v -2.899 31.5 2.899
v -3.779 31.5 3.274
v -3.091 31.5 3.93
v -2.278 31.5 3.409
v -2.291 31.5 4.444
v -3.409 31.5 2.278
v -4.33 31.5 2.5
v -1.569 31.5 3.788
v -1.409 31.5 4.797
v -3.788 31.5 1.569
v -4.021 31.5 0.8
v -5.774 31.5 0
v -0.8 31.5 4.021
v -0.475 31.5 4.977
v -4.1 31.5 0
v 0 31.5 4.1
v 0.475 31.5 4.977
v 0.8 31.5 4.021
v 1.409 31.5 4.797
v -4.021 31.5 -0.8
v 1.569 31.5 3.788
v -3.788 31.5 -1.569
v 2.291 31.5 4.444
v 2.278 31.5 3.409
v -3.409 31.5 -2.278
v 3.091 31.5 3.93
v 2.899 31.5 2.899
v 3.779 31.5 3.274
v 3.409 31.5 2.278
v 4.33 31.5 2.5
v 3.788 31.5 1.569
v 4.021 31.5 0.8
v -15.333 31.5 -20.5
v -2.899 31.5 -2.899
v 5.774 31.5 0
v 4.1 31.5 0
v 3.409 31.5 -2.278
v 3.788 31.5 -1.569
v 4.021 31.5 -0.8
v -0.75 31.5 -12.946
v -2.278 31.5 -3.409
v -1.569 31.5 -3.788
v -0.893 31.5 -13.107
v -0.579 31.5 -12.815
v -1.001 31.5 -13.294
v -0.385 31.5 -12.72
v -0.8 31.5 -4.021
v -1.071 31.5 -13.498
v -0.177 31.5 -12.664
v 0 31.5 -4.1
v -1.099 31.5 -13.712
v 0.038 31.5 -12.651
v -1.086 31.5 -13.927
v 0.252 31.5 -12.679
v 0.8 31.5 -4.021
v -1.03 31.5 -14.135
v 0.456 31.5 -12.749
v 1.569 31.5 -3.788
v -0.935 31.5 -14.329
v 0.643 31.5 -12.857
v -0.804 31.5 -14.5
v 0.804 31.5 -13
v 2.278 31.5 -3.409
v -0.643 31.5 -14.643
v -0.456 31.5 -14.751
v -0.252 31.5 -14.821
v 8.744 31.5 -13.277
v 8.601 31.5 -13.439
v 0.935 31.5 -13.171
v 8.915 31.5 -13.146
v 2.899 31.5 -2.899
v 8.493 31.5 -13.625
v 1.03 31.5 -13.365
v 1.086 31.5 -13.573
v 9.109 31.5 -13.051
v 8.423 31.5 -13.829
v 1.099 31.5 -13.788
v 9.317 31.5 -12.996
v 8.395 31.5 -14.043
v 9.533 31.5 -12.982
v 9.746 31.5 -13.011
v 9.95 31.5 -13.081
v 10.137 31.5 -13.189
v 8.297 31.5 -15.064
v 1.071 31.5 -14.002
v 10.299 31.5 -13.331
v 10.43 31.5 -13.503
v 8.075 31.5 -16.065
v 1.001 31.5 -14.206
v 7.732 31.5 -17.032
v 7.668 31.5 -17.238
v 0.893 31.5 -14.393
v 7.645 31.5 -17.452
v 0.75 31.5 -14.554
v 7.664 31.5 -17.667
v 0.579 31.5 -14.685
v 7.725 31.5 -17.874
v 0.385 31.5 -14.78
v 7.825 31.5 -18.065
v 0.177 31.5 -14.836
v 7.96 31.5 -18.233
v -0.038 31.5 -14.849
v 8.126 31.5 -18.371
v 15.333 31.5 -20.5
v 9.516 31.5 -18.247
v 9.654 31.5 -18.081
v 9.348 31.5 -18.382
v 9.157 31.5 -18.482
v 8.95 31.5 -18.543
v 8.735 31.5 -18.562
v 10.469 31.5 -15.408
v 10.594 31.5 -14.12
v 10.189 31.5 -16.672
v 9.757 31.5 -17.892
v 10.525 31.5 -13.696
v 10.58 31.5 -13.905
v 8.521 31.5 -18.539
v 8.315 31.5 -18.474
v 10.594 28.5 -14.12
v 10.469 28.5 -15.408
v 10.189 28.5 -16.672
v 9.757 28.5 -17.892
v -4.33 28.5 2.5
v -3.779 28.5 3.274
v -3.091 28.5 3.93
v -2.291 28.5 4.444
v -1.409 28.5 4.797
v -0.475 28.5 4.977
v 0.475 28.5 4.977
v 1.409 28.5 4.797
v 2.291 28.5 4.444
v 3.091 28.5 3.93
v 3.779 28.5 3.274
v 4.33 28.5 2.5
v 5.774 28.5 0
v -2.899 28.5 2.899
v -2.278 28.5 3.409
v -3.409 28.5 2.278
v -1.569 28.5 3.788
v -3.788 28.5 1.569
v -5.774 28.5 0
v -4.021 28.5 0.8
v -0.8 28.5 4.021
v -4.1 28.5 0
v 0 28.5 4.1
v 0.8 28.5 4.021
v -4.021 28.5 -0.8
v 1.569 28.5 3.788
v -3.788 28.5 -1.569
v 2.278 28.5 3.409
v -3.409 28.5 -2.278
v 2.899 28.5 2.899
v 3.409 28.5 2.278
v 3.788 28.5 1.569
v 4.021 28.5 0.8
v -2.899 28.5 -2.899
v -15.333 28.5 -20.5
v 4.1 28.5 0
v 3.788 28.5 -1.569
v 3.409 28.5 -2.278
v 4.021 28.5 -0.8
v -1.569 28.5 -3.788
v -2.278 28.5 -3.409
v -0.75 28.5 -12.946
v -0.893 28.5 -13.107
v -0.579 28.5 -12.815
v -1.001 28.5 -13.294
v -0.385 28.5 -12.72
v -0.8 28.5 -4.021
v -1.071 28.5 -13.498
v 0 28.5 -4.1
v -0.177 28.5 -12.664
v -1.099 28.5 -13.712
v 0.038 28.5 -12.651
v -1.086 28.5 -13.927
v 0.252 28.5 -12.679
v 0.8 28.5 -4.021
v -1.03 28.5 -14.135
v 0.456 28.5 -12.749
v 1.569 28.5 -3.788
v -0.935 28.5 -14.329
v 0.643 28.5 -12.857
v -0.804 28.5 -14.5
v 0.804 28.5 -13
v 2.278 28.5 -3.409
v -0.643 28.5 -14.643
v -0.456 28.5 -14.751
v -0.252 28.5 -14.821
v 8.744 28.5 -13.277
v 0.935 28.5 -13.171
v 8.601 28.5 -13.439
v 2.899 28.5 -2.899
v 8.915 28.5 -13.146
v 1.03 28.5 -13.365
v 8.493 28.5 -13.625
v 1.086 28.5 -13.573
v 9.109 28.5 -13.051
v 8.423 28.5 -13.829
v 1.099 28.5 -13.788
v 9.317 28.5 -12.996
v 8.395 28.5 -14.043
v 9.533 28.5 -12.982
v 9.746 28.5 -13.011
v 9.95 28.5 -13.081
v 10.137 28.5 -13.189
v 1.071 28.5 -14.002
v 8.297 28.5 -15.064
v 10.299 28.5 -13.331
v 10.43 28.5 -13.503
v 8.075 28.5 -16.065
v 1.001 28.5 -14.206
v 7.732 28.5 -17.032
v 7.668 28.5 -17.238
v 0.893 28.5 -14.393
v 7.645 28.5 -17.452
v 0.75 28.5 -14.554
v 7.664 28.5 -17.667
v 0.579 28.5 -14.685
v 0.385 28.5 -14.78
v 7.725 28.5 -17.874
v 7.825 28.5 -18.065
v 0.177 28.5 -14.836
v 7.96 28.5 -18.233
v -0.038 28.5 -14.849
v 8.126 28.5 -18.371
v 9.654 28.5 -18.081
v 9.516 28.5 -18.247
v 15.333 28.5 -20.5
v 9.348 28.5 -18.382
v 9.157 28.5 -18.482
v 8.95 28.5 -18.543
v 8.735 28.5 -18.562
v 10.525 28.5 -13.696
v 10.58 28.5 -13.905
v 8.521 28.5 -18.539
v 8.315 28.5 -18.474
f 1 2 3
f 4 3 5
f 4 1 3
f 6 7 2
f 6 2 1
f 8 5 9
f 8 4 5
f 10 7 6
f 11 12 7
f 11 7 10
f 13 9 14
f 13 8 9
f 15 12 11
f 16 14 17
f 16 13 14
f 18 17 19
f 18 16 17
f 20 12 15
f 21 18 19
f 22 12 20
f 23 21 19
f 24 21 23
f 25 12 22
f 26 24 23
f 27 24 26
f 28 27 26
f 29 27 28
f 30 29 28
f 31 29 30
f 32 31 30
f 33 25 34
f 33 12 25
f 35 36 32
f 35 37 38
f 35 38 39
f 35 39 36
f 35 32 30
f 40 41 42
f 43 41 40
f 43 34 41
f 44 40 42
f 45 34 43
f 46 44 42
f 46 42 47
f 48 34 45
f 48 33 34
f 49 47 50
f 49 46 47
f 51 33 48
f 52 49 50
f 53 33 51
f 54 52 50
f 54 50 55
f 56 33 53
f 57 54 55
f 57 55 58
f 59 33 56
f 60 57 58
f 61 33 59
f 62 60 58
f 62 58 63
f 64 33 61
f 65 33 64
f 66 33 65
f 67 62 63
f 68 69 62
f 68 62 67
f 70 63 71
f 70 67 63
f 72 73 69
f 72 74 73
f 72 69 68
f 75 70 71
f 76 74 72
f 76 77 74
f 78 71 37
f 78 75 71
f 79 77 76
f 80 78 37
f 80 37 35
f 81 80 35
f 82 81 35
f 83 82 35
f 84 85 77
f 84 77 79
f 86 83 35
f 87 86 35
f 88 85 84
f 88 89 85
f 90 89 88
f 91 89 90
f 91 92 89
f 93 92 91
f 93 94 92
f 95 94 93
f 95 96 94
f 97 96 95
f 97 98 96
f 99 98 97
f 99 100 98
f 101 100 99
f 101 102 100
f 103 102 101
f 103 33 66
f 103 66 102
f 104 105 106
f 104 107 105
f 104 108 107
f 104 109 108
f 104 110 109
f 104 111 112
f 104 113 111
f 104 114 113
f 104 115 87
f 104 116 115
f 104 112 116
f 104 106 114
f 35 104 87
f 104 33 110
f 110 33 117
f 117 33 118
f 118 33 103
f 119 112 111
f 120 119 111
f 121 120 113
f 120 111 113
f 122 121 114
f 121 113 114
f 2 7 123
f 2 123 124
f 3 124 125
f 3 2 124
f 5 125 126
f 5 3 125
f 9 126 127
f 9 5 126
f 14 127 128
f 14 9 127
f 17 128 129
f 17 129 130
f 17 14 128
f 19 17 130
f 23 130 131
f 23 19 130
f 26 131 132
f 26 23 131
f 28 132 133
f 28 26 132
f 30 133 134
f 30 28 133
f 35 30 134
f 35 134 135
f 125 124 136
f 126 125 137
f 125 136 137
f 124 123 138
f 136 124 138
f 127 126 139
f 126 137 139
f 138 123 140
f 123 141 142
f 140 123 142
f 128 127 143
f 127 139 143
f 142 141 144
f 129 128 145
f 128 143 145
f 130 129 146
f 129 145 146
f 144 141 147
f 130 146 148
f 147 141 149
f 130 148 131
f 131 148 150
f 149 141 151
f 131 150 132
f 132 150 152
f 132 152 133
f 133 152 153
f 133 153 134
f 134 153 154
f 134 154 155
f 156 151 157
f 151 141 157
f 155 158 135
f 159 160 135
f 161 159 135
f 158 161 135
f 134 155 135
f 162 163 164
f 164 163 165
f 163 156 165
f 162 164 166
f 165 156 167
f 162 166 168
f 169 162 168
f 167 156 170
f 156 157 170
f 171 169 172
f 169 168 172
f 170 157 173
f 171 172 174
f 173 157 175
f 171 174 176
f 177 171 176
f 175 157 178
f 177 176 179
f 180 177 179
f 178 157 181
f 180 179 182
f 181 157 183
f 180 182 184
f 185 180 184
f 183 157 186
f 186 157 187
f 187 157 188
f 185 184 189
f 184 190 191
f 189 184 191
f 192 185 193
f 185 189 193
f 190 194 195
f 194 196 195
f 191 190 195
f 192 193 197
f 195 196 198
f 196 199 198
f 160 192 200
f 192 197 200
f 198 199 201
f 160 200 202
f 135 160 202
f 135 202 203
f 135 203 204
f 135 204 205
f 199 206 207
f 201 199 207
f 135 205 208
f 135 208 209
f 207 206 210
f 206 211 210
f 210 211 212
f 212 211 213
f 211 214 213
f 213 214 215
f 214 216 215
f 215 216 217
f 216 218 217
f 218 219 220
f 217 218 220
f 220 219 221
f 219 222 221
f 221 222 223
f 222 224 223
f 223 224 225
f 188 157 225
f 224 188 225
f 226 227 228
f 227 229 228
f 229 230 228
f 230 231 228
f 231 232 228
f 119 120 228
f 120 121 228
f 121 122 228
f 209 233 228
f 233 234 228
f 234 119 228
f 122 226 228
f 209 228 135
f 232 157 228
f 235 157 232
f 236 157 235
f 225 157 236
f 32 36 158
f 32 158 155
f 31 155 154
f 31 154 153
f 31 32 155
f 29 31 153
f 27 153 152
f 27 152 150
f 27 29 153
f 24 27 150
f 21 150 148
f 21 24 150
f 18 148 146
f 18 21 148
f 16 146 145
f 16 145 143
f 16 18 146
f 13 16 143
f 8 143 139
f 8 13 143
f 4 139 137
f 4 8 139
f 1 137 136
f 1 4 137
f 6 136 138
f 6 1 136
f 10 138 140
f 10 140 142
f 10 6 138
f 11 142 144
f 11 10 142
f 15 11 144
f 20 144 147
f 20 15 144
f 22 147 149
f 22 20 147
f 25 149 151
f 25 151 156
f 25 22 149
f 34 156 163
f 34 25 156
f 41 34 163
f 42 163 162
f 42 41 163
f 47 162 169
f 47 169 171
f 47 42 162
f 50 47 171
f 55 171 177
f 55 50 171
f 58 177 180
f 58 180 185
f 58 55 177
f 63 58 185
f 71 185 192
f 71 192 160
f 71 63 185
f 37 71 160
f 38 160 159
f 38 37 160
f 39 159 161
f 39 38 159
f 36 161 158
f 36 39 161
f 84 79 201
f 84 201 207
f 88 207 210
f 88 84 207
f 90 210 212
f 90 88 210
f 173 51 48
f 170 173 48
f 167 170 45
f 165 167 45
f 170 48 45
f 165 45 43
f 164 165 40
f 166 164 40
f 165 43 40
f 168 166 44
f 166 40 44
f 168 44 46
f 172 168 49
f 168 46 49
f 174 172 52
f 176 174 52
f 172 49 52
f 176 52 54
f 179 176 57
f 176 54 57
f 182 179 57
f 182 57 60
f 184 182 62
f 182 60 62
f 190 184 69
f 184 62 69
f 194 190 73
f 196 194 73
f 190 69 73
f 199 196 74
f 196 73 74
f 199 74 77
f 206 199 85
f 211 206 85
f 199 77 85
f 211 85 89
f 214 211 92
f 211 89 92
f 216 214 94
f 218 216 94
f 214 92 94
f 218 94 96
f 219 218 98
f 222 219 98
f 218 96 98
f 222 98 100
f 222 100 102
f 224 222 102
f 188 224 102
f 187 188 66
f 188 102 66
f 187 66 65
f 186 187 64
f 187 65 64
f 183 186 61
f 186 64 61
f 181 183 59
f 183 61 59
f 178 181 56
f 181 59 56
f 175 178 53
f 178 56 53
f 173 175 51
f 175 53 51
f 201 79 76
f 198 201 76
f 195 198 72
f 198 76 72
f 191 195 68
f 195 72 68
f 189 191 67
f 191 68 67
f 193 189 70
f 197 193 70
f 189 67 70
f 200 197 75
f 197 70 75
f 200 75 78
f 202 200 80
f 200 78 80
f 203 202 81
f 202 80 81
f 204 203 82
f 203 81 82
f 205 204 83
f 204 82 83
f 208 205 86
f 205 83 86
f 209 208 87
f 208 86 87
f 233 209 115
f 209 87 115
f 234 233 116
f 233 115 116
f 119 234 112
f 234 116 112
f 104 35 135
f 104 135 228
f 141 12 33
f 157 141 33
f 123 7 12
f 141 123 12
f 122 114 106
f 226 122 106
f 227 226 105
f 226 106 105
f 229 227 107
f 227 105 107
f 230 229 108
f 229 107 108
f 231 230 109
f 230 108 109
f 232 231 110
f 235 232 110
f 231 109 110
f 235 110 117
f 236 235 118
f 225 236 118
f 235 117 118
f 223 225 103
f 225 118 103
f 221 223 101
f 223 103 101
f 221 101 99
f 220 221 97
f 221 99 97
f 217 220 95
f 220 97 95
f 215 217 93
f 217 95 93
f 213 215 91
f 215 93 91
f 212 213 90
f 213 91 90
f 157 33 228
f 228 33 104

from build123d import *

# Parameters (mm, degrees)
SKETCH006_R                = 1.1
EXTRUDE007_DEPTH           = 3
EXTRUDE007_PLACEMENT_ANGLE = 180
FUSION006_PLACEMENT_ANGLE  = 2
CYLINDER007_R              = 4.1
CYLINDER007_DEPTH          = 3
EXTRUDE005_DEPTH           = 3


with BuildPart() as bearingcoupler_limitswitchmount:
    # Sketch006 → Extrude007 (new body)
    with BuildSketch(Plane.XZ):
        Circle(SKETCH006_R)
        with BuildLine():
            ThreePointArc((-8.4, 0), (-8.259343, -1.53077), (-7.842081, -3.010276))
            ThreePointArc((-9.89596, -3.798682), (-8.474818, -4.431418), (-7.842081, -3.010276))
            ThreePointArc((-10.6, 0), (-10.422504, -1.931687), (-9.89596, -3.798682))
            ThreePointArc((-8.4, 0), (-9.5, 1.1), (-10.6, 0))
        make_face()
    extrude(amount=-EXTRUDE007_DEPTH)


with BuildPart() as bearingcoupler_limitswitchmount_1:
    # Extrude007 placement: moved
    add(bearingcoupler_limitswitchmount.part.rotate(Axis((0, 0, 0), (0, 0, 1)), EXTRUDE007_PLACEMENT_ANGLE))


with BuildPart() as bearingcoupler_limitswitchmount_2:
    # Fusion006 placement: moved
    add(bearingcoupler_limitswitchmount_1.part.moved(Location((0, 0, -13.75))).rotate(Axis((0, 0, -13.75), (0, 1, 0)), FUSION006_PLACEMENT_ANGLE))


with BuildPart() as bearingcoupler_bearinghole:
    # Cylinder007 → Cylinder007 (new body)
    with BuildSketch(Plane.XZ):
        Circle(CYLINDER007_R)
    extrude(amount=CYLINDER007_DEPTH)


with BuildPart() as cut013:
    # Sketch004 → Extrude005 (new body)
    with BuildSketch(Plane(origin=(0, 0, 0), x_dir=(1, 0, 0), z_dir=(0, 1, 0))):
        with BuildLine():
            ThreePointArc((-4.330127, -2.5), (0, -5), (4.330127, -2.5))
            Line((4.330127, -2.5), (5.773503, 0))
            Line((5.773503, 0), (15.33281, 20.5))
            Line((-15.33281, 20.5), (15.33281, 20.5))
            Line((-5.773503, 0), (-15.33281, 20.5))
            Line((-4.330127, -2.5), (-5.773503, 0))
        make_face()
    extrude(amount=-EXTRUDE005_DEPTH)

    # Cut006: cut bearingCoupler_bearingHole
    add(bearingcoupler_bearinghole.part, mode=Mode.SUBTRACT)

    # Cut013: cut bearingCoupler_limitSwitchMount
    add(bearingcoupler_limitswitchmount_2.part, mode=Mode.SUBTRACT)


with BuildPart() as cut013_1:
    # Cut013 placement: moved
    add(cut013.part.moved(Location((0, 31.5, 0))))


solid = cut013_1.part
